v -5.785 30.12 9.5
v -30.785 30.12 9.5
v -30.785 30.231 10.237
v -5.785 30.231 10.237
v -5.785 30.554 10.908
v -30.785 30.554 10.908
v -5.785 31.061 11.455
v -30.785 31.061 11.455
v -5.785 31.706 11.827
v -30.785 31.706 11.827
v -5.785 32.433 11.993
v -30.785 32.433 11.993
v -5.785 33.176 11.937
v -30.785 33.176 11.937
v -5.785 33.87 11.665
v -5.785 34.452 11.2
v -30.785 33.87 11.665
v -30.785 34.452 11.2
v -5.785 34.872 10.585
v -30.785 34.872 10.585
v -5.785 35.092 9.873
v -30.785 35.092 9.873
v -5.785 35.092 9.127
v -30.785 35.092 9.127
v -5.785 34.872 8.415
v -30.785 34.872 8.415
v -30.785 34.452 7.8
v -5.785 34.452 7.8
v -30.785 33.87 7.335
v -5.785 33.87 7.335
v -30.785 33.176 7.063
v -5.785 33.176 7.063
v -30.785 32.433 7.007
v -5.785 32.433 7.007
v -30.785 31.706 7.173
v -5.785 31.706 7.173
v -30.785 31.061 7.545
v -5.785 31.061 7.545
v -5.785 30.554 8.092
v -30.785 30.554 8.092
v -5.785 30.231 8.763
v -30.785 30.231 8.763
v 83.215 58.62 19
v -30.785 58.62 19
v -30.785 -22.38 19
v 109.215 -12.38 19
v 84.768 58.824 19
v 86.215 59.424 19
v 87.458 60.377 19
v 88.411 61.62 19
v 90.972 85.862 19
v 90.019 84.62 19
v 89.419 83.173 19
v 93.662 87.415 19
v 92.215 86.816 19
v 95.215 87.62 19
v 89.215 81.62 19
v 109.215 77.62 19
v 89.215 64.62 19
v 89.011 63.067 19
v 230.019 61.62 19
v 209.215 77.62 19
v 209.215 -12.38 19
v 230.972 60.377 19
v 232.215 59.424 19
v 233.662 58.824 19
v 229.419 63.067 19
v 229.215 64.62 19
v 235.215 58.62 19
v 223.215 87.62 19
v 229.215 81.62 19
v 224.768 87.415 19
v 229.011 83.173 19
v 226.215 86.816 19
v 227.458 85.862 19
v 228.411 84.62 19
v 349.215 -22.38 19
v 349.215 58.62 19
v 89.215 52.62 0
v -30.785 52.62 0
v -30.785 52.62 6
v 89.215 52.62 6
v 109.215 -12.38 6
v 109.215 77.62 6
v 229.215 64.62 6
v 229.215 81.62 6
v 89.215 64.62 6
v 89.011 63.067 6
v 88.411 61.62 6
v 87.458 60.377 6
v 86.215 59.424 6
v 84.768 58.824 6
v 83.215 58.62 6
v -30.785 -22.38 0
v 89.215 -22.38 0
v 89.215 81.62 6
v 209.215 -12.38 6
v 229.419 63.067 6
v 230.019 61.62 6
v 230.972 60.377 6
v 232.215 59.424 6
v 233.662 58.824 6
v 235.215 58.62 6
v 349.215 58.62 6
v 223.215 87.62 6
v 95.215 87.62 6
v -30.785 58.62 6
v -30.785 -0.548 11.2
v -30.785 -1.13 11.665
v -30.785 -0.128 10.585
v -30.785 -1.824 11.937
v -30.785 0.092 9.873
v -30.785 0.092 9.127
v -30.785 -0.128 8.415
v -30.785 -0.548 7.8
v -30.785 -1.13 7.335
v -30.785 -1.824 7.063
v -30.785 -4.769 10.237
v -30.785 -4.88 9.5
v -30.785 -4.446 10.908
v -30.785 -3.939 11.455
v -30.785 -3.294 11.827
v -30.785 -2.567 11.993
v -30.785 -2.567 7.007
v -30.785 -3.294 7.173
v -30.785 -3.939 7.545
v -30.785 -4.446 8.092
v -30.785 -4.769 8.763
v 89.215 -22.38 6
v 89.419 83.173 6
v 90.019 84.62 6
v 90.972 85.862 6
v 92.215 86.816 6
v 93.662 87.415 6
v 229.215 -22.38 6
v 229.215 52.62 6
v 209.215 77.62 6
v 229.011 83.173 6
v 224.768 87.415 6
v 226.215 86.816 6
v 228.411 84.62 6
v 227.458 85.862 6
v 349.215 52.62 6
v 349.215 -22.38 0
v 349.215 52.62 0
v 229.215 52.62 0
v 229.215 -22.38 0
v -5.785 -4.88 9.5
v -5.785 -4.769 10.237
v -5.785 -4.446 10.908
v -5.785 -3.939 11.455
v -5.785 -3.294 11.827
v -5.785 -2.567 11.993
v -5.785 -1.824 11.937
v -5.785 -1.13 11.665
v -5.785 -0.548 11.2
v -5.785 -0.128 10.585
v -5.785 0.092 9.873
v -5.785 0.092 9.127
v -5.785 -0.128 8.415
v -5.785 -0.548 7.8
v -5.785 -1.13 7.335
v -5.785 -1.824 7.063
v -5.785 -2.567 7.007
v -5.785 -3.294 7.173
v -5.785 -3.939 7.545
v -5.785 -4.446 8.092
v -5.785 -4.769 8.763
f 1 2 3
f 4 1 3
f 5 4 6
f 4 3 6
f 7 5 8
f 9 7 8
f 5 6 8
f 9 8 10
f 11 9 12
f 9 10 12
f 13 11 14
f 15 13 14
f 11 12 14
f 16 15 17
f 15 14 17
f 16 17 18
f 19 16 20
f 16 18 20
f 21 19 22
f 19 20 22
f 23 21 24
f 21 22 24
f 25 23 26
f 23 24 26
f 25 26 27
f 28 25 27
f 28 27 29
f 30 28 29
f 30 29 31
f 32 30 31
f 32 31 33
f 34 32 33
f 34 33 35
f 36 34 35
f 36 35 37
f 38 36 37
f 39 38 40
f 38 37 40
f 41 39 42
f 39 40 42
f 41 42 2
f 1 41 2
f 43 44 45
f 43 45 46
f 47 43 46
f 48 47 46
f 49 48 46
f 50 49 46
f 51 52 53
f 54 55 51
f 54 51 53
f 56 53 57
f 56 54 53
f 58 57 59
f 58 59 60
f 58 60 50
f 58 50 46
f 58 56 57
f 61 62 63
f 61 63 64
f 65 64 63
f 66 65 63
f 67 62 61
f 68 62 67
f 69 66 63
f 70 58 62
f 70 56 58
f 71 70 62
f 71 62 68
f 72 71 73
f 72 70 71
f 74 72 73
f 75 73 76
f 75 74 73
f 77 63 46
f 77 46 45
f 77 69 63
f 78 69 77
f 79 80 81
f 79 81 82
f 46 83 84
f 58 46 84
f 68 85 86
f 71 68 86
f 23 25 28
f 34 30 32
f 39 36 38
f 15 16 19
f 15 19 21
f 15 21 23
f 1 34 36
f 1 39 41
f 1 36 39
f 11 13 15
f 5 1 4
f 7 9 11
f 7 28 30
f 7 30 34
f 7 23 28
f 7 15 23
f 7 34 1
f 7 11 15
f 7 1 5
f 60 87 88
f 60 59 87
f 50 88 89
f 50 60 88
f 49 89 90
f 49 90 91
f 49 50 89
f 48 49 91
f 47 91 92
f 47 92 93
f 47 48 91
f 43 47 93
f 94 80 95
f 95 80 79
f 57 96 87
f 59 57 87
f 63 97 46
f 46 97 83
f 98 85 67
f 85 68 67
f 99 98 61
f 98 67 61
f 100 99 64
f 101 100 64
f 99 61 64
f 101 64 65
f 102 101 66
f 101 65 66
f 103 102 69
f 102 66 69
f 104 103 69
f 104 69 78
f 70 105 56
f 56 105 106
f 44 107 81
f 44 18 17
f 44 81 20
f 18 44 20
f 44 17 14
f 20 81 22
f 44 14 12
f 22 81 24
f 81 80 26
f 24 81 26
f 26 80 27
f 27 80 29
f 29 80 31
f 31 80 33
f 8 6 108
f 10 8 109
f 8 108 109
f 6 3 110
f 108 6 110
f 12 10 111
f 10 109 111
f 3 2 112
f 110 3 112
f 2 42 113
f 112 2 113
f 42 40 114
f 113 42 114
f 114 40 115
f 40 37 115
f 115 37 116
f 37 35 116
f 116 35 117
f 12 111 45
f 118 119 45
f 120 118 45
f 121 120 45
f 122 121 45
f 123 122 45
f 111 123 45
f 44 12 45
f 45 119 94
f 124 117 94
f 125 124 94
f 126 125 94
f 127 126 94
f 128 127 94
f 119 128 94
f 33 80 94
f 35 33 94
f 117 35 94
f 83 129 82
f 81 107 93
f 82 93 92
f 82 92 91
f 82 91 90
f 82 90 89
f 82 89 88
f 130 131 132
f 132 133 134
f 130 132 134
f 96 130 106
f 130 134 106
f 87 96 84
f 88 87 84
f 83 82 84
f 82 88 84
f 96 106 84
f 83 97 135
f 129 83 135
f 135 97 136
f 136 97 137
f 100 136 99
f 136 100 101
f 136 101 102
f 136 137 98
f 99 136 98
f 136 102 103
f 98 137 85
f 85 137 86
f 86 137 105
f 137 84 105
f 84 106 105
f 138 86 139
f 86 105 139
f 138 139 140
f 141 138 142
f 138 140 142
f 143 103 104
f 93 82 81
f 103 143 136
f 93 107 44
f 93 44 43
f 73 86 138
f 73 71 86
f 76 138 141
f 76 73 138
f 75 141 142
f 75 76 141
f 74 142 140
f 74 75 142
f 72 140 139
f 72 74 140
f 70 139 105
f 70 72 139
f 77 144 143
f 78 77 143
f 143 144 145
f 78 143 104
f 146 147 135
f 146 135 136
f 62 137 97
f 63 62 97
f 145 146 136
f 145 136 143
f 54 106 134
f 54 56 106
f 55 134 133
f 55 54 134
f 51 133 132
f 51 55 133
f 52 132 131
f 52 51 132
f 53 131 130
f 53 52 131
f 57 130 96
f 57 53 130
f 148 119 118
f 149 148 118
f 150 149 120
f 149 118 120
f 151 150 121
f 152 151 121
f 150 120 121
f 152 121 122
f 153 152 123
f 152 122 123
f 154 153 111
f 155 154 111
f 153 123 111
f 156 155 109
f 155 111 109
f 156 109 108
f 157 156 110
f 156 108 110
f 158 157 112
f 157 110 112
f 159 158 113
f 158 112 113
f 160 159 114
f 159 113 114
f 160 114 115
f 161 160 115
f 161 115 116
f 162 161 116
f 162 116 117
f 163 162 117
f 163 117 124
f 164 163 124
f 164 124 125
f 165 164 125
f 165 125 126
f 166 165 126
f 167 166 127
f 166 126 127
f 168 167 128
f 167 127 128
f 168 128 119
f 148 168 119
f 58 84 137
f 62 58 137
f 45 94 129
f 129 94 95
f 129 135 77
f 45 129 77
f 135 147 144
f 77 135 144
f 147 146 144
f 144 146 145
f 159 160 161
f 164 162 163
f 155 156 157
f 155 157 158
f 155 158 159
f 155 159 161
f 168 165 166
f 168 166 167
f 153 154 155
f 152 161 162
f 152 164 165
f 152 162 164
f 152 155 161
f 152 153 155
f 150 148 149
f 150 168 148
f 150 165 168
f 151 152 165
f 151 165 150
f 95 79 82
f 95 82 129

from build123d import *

# Parameters (mm, degrees)
F0_W     = 120
F0_H     = 6
F0_W_2   = 6
F0_H_2   = 23
F0_H_3   = 75
F1_DEPTH = 19
F2_DEPTH = 6
F3_R     = 6
F4_R     = 2.5
F5_DEPTH = 25


with BuildPart() as f1:
    # F0 (on Top) → F1 (new body)
    with BuildSketch(Plane.XY):
        with Locations((29.2149764299, 55.6197040975)):
            Rectangle(F0_W, F0_H)
        with Locations((92.2149764299, 70.1197040975)):
            Rectangle(F0_W_2, F0_H_2)
        with Locations((92.2149764299, 55.6197040975)):
            Rectangle(F0_W_2, F0_H)
        with Locations((29.2149764299, 15.1197040975)):
            Rectangle(F0_W, F0_H_3)
        Polygon((109.2149764299, 58.6197040975), (95.2149764299, 58.6197040975), (95.2149764299, 52.6197040975), (89.2149764299, 52.6197040975), (89.2149764299, -22.3802959025), (159.2149764299, -22.3802959025), (159.2149764299, -12.3802959025), (109.2149764299, -12.3802959025), align=None)
        Polygon((89.2149764299, 87.6197040975), (89.2149764299, 81.6197040975), (95.2149764299, 81.6197040975), (159.2149764299, 81.6197040975), (159.2149764299, 87.6197040975), align=None)
        Polygon((159.2149764299, 87.6197040975), (159.2149764299, 81.6197040975), (223.2149764299, 81.6197040975), (229.2149764299, 81.6197040975), (229.2149764299, 87.6197040975), align=None)
        Polygon((159.2149764299, -12.3802959025), (159.2149764299, -22.3802959025), (229.2149764299, -22.3802959025), (229.2149764299, 52.6197040975), (229.2137485743, 52.6197040975), (223.2149764299, 52.6197040975), (223.2149764299, 58.6197040975), (209.2149764299, 58.6197040975), (209.2149764299, -12.3802959025), align=None)
        with Locations((226.2149764299, 70.1197040975)):
            Rectangle(F0_W_2, F0_H_2)
        with Locations((289.2149764299, 15.1197040975)):
            Rectangle(F0_W, F0_H_3)
        Polygon((229.2149764299, 58.6197040975), (223.2149764299, 58.6197040975), (223.2149764299, 52.6197040975), (229.2137485743, 52.6197040975), (229.2149764299, 52.6197040975), align=None)
        with Locations((289.2149764299, 55.6197040975)):
            Rectangle(F0_W, F0_H)
        Polygon((95.2149764299, 81.6197040975), (95.2149764299, 58.6197040975), (109.2149764299, 58.6197040975), (109.2149764299, 77.6197040975), (159.2149764299, 77.6197040975), (159.2149764299, 81.6197040975), align=None)
        Polygon((223.2149764299, 81.6197040975), (159.2149764299, 81.6197040975), (159.2149764299, 77.6197040975), (209.2149764299, 77.6197040975), (209.2149764299, 58.6197040975), (223.2149764299, 58.6197040975), align=None)
    extrude(amount=F1_DEPTH)

    # F0 (on Top) → F2 (cut)
    with BuildSketch(Plane.XY):
        with Locations((29.2149764299, 55.6197040975)):
            Rectangle(F0_W, F0_H)
        with Locations((92.2149764299, 55.6197040975)):
            Rectangle(F0_W_2, F0_H)
        with Locations((289.2149764299, 55.6197040975)):
            Rectangle(F0_W, F0_H)
        with Locations((92.2149764299, 70.1197040975)):
            Rectangle(F0_W_2, F0_H_2)
        Polygon((89.2149764299, 87.6197040975), (89.2149764299, 81.6197040975), (95.2149764299, 81.6197040975), (159.2149764299, 81.6197040975), (159.2149764299, 87.6197040975), align=None)
        Polygon((159.2149764299, 87.6197040975), (159.2149764299, 81.6197040975), (223.2149764299, 81.6197040975), (229.2149764299, 81.6197040975), (229.2149764299, 87.6197040975), align=None)
        with Locations((226.2149764299, 70.1197040975)):
            Rectangle(F0_W_2, F0_H_2)
        Polygon((229.2149764299, 58.6197040975), (223.2149764299, 58.6197040975), (223.2149764299, 52.6197040975), (229.2137485743, 52.6197040975), (229.2149764299, 52.6197040975), align=None)
        Polygon((159.2149764299, -12.3802959025), (159.2149764299, -22.3802959025), (229.2149764299, -22.3802959025), (229.2149764299, 52.6197040975), (229.2137485743, 52.6197040975), (223.2149764299, 52.6197040975), (223.2149764299, 58.6197040975), (209.2149764299, 58.6197040975), (209.2149764299, -12.3802959025), align=None)
        Polygon((109.2149764299, 58.6197040975), (95.2149764299, 58.6197040975), (95.2149764299, 52.6197040975), (89.2149764299, 52.6197040975), (89.2149764299, -22.3802959025), (159.2149764299, -22.3802959025), (159.2149764299, -12.3802959025), (109.2149764299, -12.3802959025), align=None)
        Polygon((223.2149764299, 81.6197040975), (159.2149764299, 81.6197040975), (159.2149764299, 77.6197040975), (209.2149764299, 77.6197040975), (209.2149764299, 58.6197040975), (223.2149764299, 58.6197040975), align=None)
        Polygon((95.2149764299, 81.6197040975), (95.2149764299, 58.6197040975), (109.2149764299, 58.6197040975), (109.2149764299, 77.6197040975), (159.2149764299, 77.6197040975), (159.2149764299, 81.6197040975), align=None)
    extrude(amount=F2_DEPTH, mode=Mode.SUBTRACT)

    # F3
    f3_edges = [f1.edges().sort_by_distance(p)[0] for p in [
        (229.214976, 58.619704, 12.5),
        (229.214976, 87.619704, 12.5),
        (89.214976, 87.619704, 12.5),
        (89.214976, 58.619704, 12.5),
    ]]
    fillet(f3_edges, radius=F3_R)

    # F4 (on face) → F5 (cut)
    with BuildSketch(Plane(origin=(-30.7850235701, 0, 0), x_dir=(0, -1, 0), z_dir=(-1, 0, 0))):
        with Locations((-32.6197040975, 9.5)):
            Circle(F4_R)
        with Locations((2.3802959025, 9.5)):
            Circle(F4_R)
    extrude(amount=-F5_DEPTH, mode=Mode.SUBTRACT)


solid = f1.part
